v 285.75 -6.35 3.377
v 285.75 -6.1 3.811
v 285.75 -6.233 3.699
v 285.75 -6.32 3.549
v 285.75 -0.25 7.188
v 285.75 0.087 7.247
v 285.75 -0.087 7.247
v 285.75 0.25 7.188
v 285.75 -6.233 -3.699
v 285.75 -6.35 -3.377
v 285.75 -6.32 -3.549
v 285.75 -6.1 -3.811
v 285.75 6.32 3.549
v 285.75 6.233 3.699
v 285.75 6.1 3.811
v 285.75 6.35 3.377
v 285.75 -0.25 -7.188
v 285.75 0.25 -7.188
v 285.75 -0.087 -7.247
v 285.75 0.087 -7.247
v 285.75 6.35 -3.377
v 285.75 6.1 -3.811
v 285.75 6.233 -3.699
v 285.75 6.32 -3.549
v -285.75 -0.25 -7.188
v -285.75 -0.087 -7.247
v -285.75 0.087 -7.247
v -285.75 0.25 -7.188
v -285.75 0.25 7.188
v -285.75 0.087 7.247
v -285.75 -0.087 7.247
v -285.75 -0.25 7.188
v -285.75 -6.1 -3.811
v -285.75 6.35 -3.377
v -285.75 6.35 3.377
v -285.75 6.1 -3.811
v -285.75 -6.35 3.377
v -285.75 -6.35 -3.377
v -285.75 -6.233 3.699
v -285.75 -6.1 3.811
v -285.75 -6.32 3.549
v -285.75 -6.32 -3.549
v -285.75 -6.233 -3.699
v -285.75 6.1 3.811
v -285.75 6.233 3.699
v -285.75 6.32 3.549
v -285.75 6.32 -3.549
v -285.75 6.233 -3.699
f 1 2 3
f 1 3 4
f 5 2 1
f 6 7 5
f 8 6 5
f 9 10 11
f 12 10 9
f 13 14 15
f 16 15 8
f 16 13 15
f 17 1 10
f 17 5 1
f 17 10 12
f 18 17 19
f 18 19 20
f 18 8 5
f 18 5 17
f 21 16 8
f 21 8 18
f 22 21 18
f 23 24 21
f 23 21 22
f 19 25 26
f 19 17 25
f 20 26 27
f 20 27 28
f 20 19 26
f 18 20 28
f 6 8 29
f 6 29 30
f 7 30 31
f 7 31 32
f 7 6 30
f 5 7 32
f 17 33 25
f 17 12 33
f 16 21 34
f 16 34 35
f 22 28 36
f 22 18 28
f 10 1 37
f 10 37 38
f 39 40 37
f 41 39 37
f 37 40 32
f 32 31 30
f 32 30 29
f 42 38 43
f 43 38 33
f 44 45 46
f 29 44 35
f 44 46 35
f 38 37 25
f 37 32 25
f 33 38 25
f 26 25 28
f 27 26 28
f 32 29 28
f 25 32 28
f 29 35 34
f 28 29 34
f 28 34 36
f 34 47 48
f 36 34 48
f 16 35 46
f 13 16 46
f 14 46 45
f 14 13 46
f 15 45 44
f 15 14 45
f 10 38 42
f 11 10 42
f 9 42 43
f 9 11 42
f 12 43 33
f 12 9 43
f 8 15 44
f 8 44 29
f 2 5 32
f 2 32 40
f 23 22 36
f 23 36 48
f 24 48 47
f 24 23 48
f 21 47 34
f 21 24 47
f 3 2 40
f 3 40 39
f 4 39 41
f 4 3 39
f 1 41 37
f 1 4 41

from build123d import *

# Parameters (mm, degrees)
BOSS_EXTRUDE1_DEPTH = 285.75


with BuildPart() as part:
    # Sketch1 → Boss-Extrude1 (new, symmetric)
    with BuildSketch(Plane(origin=(0, 0, 0), x_dir=(0, 0, -1), z_dir=(1, 0, 0))):
        with BuildLine():
            Line((7.188010851, 0.25), (3.810511777, 6.1))
            ThreePointArc((3.810511777, 6.1), (3.627499075, 6.283012702), (3.377499075, 6.35))
            Line((3.377499075, 6.35), (-3.377499075, 6.35))
            ThreePointArc((-3.377499075, 6.35), (-3.627499075, 6.283012702), (-3.810511777, 6.1))
            Line((-3.810511777, 6.1), (-7.188010851, 0.25))
            ThreePointArc((-7.188010851, 0.25), (-7.25499815, 0), (-7.188010851, -0.25))
            Line((-7.188010851, -0.25), (-3.810511777, -6.1))
            ThreePointArc((-3.810511777, -6.1), (-3.627499075, -6.283012702), (-3.377499075, -6.35))
            Line((-3.377499075, -6.35), (3.377499075, -6.35))
            ThreePointArc((3.377499075, -6.35), (3.627499075, -6.283012702), (3.810511777, -6.1))
            Line((3.810511777, -6.1), (7.188010851, -0.25))
            ThreePointArc((7.188010851, -0.25), (7.25499815, 0), (7.188010851, 0.25))
        make_face()
    extrude(amount=BOSS_EXTRUDE1_DEPTH, both=True)


solid = part.part
